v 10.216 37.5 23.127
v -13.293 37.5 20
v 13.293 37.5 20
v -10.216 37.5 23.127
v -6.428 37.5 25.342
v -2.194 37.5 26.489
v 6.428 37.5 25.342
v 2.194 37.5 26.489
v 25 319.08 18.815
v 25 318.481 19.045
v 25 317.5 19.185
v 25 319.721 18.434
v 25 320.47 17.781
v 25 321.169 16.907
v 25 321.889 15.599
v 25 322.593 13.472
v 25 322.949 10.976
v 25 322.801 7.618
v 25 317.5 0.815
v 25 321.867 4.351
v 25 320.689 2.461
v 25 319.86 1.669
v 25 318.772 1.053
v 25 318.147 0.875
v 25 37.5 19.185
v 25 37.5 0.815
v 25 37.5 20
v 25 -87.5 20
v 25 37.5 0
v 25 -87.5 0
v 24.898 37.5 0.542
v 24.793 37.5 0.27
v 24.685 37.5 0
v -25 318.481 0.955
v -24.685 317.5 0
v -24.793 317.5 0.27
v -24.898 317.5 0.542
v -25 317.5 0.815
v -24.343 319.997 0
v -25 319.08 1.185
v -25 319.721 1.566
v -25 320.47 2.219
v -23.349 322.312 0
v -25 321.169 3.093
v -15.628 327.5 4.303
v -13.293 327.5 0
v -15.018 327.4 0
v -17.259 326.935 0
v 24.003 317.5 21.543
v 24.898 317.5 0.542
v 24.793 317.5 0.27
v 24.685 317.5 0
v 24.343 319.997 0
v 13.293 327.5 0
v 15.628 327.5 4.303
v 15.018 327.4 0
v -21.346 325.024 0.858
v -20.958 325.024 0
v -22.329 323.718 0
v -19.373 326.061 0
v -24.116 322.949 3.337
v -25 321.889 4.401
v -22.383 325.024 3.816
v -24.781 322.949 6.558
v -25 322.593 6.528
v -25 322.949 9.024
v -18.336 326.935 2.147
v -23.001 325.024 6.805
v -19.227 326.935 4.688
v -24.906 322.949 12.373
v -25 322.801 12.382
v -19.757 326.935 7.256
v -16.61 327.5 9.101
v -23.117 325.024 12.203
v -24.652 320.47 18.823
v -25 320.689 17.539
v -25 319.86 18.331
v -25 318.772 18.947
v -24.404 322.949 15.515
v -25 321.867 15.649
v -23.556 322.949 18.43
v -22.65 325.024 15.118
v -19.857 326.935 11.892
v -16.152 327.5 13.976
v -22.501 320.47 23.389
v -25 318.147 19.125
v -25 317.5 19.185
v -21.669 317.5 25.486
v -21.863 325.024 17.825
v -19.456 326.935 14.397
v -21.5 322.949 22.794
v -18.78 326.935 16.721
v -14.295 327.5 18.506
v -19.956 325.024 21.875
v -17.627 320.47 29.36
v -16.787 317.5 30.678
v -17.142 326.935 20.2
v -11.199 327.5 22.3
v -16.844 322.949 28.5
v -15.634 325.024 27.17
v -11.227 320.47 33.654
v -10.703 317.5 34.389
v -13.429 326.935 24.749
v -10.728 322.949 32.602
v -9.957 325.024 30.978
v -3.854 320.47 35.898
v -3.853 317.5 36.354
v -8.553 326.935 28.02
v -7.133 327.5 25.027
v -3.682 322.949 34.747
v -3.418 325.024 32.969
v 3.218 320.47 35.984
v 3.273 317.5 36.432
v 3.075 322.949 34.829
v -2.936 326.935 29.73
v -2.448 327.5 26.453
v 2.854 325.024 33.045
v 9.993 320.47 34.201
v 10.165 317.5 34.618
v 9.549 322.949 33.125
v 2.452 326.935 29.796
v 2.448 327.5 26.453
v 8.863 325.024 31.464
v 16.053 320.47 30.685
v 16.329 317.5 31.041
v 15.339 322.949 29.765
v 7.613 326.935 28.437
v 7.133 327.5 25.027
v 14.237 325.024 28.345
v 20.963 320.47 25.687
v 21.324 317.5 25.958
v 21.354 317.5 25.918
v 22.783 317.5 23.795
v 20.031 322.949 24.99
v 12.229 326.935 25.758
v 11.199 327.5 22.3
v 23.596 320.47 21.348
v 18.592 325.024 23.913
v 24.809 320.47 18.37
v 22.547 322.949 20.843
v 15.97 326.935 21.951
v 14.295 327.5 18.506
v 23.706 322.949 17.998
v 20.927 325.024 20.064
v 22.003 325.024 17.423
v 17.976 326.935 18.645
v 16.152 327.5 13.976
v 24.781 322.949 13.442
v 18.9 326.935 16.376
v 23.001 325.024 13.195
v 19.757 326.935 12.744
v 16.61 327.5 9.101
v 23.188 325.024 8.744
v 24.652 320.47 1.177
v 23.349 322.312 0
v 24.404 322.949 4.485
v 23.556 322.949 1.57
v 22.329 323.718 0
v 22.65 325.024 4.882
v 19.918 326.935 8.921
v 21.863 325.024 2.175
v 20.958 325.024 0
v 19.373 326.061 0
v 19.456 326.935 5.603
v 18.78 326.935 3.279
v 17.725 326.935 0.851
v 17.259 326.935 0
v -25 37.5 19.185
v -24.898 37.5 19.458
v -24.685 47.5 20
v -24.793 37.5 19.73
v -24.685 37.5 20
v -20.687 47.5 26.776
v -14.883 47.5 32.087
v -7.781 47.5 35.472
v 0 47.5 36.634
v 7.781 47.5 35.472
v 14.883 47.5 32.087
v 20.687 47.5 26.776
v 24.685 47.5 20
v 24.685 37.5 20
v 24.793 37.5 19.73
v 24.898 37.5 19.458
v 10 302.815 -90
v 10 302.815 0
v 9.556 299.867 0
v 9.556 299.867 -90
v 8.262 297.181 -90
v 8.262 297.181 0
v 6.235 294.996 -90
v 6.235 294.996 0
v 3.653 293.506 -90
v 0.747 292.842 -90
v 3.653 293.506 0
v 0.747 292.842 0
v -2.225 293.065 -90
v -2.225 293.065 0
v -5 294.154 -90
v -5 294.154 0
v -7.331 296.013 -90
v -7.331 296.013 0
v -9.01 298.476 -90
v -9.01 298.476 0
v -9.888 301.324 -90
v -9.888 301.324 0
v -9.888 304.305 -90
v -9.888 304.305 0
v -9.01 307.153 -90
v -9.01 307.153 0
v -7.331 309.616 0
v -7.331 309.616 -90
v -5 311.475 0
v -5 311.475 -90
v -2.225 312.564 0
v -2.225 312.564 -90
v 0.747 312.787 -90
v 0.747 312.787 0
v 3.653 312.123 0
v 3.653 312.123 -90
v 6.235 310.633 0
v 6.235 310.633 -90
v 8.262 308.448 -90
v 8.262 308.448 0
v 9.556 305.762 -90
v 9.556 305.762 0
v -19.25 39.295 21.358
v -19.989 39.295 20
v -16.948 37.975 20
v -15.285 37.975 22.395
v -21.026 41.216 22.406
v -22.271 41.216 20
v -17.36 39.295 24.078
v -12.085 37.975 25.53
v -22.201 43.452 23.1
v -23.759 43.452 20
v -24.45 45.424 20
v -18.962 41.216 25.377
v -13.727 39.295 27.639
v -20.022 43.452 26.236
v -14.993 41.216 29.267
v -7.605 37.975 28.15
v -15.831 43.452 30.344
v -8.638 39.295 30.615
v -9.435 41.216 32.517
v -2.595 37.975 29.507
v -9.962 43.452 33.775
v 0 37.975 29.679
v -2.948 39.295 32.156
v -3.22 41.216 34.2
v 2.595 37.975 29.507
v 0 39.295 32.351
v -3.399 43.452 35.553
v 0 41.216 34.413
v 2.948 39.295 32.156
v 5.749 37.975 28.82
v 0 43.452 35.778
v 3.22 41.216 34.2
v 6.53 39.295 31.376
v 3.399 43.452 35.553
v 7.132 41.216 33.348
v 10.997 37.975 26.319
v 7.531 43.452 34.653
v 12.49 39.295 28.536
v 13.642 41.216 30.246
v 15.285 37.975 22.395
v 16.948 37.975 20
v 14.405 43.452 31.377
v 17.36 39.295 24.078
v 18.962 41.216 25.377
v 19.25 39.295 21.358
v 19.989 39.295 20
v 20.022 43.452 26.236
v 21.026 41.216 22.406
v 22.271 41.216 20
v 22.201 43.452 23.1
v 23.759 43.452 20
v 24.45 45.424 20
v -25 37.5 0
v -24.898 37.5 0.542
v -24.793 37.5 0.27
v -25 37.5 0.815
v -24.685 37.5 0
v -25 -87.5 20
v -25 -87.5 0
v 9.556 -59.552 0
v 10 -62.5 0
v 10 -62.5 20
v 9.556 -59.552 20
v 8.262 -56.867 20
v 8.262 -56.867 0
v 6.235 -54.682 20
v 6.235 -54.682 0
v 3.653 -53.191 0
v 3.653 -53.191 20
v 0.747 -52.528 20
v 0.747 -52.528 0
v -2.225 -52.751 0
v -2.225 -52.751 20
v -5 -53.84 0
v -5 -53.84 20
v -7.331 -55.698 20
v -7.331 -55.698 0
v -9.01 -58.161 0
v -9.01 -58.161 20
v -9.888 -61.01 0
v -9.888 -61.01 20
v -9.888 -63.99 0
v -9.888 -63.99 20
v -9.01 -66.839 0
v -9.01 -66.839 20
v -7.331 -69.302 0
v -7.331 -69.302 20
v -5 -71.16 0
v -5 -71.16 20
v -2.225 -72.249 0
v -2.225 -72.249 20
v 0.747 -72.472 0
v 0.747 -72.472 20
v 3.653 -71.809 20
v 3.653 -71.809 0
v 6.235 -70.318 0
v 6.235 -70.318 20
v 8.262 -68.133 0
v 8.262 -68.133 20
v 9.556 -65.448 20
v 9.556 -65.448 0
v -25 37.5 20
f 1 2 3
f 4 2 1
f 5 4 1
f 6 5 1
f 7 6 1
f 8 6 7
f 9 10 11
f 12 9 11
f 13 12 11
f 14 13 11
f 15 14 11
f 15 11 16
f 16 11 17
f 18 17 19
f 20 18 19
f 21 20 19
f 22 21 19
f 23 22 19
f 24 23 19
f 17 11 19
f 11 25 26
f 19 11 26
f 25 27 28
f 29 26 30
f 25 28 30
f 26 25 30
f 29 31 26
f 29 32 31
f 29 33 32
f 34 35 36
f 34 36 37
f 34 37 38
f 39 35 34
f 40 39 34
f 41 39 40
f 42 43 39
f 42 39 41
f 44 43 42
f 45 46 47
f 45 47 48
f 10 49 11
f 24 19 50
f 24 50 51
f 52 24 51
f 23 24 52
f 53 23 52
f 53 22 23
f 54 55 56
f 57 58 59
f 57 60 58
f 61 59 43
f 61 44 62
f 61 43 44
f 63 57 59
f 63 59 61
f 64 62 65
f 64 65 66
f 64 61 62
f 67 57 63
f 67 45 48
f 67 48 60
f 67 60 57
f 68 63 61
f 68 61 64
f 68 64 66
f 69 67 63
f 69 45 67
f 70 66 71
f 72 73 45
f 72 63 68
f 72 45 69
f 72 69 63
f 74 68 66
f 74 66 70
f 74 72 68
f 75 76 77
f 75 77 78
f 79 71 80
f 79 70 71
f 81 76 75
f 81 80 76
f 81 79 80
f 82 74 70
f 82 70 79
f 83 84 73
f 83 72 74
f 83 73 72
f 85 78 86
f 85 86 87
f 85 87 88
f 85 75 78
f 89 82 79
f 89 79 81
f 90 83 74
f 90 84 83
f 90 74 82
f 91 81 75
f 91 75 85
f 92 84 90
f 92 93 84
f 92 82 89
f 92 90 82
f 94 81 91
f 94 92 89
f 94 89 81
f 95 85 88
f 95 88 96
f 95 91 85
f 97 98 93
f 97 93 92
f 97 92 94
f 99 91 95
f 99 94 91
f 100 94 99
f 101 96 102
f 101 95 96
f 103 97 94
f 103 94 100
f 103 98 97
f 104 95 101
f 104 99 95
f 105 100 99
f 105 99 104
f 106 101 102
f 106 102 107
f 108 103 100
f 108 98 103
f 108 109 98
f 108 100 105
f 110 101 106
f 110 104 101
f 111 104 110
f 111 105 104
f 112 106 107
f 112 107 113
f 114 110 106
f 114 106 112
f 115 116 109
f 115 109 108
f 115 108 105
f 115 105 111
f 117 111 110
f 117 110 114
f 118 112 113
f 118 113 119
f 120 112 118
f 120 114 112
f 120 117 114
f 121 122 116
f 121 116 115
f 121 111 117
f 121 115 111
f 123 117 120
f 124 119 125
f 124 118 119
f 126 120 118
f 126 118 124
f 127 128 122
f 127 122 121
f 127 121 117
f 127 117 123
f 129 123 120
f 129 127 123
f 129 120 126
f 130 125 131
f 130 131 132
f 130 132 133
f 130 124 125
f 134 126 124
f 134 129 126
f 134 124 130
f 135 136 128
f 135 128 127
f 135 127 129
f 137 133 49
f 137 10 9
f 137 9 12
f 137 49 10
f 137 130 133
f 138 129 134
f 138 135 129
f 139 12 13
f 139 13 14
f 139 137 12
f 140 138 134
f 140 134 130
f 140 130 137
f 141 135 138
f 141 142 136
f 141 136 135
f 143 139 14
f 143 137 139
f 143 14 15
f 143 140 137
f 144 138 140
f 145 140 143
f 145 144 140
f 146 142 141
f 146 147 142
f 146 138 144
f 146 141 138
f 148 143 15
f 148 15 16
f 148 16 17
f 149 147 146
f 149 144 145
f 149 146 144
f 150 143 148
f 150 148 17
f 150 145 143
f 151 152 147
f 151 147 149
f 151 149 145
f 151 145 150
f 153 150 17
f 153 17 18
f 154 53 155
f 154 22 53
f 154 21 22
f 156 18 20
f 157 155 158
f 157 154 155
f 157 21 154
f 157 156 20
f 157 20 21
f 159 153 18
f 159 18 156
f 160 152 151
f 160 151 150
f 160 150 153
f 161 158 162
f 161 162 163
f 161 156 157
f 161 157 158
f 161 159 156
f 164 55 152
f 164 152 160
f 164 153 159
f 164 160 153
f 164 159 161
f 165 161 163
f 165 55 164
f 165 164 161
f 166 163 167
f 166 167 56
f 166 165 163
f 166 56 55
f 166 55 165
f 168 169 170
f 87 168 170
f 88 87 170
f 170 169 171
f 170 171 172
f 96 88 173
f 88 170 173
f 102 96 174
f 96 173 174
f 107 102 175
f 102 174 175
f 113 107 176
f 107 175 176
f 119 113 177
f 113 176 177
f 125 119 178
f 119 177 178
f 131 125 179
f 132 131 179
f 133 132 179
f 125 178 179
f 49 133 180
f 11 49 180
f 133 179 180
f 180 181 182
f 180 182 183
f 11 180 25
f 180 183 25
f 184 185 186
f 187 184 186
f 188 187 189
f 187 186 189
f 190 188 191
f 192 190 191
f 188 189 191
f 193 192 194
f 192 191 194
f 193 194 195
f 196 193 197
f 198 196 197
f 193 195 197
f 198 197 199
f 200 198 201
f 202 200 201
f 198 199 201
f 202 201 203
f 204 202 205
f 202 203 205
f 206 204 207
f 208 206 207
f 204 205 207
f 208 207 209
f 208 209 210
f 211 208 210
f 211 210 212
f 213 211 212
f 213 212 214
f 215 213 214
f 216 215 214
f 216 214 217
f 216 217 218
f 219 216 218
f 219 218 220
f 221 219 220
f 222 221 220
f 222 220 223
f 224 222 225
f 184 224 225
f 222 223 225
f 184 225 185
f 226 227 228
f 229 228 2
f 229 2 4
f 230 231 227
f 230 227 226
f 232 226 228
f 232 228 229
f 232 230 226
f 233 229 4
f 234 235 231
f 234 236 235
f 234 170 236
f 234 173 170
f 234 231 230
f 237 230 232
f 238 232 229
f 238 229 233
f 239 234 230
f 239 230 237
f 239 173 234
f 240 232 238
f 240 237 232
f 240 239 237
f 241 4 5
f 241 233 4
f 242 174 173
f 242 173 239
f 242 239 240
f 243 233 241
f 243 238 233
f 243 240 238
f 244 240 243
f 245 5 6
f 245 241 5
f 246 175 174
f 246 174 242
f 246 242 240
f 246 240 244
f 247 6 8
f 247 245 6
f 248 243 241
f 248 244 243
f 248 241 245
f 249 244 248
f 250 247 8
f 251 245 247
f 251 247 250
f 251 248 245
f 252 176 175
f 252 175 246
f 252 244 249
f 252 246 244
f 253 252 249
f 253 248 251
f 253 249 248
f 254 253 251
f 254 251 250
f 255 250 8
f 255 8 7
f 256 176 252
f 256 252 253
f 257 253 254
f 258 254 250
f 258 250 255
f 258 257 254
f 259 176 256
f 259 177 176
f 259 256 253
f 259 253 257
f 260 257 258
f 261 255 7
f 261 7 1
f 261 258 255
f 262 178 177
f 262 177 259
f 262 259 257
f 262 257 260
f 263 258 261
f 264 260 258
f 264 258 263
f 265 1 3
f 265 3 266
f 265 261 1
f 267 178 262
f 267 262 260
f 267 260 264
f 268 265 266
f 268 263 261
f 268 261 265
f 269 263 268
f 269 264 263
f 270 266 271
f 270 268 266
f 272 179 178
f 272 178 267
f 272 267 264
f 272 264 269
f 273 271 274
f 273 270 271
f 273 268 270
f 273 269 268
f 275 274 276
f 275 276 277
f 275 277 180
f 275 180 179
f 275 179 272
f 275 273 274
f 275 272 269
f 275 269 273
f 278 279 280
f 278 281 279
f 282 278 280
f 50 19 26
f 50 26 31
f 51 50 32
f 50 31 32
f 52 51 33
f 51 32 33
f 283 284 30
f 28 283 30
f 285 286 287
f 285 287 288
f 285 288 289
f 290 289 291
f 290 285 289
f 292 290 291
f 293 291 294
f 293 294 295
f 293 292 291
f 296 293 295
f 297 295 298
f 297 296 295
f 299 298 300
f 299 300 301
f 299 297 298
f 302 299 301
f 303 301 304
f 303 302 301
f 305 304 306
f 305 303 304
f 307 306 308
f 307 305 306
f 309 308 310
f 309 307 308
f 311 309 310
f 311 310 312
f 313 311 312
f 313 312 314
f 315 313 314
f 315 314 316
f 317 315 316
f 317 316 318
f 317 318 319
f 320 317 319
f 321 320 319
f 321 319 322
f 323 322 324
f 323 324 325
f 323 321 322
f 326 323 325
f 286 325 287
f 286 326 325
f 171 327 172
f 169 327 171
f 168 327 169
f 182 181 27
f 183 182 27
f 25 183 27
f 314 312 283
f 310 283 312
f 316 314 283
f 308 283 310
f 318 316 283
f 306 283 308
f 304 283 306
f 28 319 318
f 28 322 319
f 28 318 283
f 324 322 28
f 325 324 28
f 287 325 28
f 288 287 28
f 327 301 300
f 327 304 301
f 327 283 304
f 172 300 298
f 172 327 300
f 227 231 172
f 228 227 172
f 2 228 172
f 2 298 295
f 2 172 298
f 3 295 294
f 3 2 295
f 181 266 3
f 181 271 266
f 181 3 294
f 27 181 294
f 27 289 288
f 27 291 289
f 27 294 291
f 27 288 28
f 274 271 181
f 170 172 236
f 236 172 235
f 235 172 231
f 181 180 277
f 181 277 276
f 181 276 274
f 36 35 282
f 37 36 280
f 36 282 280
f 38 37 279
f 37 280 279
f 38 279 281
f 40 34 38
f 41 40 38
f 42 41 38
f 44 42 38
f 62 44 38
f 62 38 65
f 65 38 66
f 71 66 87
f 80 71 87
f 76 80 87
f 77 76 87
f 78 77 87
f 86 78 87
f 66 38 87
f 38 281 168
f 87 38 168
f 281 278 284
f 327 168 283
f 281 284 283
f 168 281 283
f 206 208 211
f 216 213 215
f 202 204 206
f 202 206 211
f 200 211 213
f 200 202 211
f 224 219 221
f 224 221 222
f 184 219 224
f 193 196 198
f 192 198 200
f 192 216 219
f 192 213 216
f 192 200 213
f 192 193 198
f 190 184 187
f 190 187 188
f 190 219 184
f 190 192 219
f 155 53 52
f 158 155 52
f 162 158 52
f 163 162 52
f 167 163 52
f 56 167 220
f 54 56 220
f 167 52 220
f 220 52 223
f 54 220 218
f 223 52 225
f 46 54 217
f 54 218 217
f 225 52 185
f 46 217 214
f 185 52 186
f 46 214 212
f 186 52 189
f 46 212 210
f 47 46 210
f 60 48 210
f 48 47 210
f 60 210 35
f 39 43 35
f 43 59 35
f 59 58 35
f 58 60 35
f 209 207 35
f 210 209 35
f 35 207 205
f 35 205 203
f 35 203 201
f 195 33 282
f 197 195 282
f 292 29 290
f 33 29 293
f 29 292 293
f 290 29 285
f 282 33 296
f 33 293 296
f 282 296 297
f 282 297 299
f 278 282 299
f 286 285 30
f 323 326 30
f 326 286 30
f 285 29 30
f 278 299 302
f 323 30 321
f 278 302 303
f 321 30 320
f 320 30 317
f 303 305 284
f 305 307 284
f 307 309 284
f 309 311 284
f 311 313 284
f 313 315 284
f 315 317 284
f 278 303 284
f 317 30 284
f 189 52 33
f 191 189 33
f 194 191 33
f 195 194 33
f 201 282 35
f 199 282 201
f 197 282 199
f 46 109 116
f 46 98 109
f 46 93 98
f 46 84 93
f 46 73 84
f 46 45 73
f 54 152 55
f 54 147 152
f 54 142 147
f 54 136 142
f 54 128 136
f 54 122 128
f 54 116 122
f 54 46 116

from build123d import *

# Parameters (mm, degrees)
ESQUISSE1_W        = 50
ESQUISSE1_H        = 125
ESQUISSE1_R        = 10
BOSS_EXTRU_1_DEPTH = 20
BOSS_EXTRU_2_DEPTH = 290
ESQUISSE4_R        = 10
BOSS_EXTRU_3_DEPTH = 90
CONG_1_R           = 10


with BuildPart() as part:
    # Esquisse1 → Boss.-Extru.1 (new body)
    with BuildSketch(Plane.XY):
        with Locations((0, -25)):
            Rectangle(ESQUISSE1_W, ESQUISSE1_H)
        with Locations((0, -62.5)):
            Circle(ESQUISSE1_R, mode=Mode.SUBTRACT)
    extrude(amount=BOSS_EXTRU_1_DEPTH)

    # Esquisse2 → Boss.-Extru.2 (add)
    with BuildSketch(Plane(origin=(0, 37.5, 0), x_dir=(1, 0, 0), z_dir=(0, 1, 0))):
        with BuildLine():
            ThreePointArc((25, -0.81456696), (24.846070853, -0.405994408), (24.685464957, 0))
            Line((24.685464957, 0), (-24.685464957, 0))
            ThreePointArc((-24.685464957, 0), (-24.846070853, -0.405994408), (-25, -0.81456696))
            Line((-25, -0.81456696), (-25, -19.18543304))
            ThreePointArc((-25, -19.18543304), (0, -36.634041753), (25, -19.18543304))
            Line((25, -19.18543304), (25, -0.81456696))
        make_face()
    extrude(amount=BOSS_EXTRU_2_DEPTH)

    # Esquisse4 → Boss.-Extru.3 (add)
    with BuildSketch(Plane(origin=(0, 0, 0), x_dir=(-1, 0, 0), z_dir=(0, 0, -1))):
        with Locations(Location((0, 302.814535043, 0), (0, 0, 180))):
            Circle(ESQUISSE4_R)
    extrude(amount=BOSS_EXTRU_3_DEPTH)

    # Congé1
    # the kernel refuses this fillet: 10 mm, written as the material it takes off along each edge
    with BuildSketch(Plane(origin=(0, 37.5, 10), x_dir=(-0.8501027120778188, 0, -0.5266169185640897), z_dir=(0.5266169185640897, 0, -0.8501027120778188))) as cong_1_piece_1_section:
        with BuildLine():
            CenterArc((26.634041753 - CONG_1_R, CONG_1_R), CONG_1_R, 270, 90)
            Line((26.634041753 - CONG_1_R, 0), (26.634041753, 0))
            Line((26.634041753, 0), (26.634041753, CONG_1_R))
        make_face()
    cong_1_piece_1 = revolve(axis=Axis((0, 37.5, 10), (0, 1, 0)), revolution_arc=243.554314658, mode=Mode.PRIVATE)
    cong_1_piece_1 = split(cong_1_piece_1, bisect_by=Plane(origin=(0, 40.353738925, 20), z_dir=(0, 0, 1)), keep=Keep.TOP, mode=Mode.PRIVATE)
    add(cong_1_piece_1, mode=Mode.SUBTRACT)
    with BuildSketch(Plane(origin=(0, 327.5, 10), x_dir=(-0.8323565470530717, 0, -0.5542405421636779), z_dir=(0.5542405421636779, 0, -0.8323565470530717))) as cong_1_piece_2:
        with BuildLine():
            CenterArc((26.634041753 - CONG_1_R, -CONG_1_R), CONG_1_R, 0, 90)
            Line((26.634041753, -CONG_1_R), (26.634041753, 0))
            Line((26.634041753, 0), (26.634041753 - CONG_1_R, 0))
        make_face()
    revolve(axis=Axis((0, 327.5, 10), (0, 1, 0)), revolution_arc=247.316842265, mode=Mode.SUBTRACT)
    with BuildSketch(Plane(origin=(0, 327.5, 10), x_dir=(0.8328594865150245, 0, 0.5534844855295674), z_dir=(-0.5534844855295674, 0, 0.8328594865150245))) as cong_1_piece_3:
        with BuildLine():
            CenterArc((26.634041753 - CONG_1_R, -CONG_1_R), CONG_1_R, 0, 90)
            Line((26.634041753, -CONG_1_R), (26.634041753, 0))
            Line((26.634041753, 0), (26.634041753 - CONG_1_R, 0))
        make_face()
    revolve(axis=Axis((0, 327.5, 10), (0, 1, 0)), revolution_arc=109.439699246, mode=Mode.SUBTRACT)
    with BuildSketch(Plane(origin=(0, 327.5, 10), x_dir=(-0.2447438061673637, 0, -0.9695877832061993), z_dir=(0.9695877832061993, 0, -0.2447438061673637))) as cong_1_piece_4:
        with BuildLine():
            CenterArc((26.634041753 - CONG_1_R, -CONG_1_R), CONG_1_R, 0, 90)
            Line((26.634041753 - CONG_1_R, 0), (26.634041753, 0))
            Line((26.634041753, 0), (26.634041753, -CONG_1_R))
        make_face()
    revolve(axis=Axis((0, 327.5, 10), (0, 1, 0)), revolution_arc=109.439699247, mode=Mode.SUBTRACT)


solid = part.part
